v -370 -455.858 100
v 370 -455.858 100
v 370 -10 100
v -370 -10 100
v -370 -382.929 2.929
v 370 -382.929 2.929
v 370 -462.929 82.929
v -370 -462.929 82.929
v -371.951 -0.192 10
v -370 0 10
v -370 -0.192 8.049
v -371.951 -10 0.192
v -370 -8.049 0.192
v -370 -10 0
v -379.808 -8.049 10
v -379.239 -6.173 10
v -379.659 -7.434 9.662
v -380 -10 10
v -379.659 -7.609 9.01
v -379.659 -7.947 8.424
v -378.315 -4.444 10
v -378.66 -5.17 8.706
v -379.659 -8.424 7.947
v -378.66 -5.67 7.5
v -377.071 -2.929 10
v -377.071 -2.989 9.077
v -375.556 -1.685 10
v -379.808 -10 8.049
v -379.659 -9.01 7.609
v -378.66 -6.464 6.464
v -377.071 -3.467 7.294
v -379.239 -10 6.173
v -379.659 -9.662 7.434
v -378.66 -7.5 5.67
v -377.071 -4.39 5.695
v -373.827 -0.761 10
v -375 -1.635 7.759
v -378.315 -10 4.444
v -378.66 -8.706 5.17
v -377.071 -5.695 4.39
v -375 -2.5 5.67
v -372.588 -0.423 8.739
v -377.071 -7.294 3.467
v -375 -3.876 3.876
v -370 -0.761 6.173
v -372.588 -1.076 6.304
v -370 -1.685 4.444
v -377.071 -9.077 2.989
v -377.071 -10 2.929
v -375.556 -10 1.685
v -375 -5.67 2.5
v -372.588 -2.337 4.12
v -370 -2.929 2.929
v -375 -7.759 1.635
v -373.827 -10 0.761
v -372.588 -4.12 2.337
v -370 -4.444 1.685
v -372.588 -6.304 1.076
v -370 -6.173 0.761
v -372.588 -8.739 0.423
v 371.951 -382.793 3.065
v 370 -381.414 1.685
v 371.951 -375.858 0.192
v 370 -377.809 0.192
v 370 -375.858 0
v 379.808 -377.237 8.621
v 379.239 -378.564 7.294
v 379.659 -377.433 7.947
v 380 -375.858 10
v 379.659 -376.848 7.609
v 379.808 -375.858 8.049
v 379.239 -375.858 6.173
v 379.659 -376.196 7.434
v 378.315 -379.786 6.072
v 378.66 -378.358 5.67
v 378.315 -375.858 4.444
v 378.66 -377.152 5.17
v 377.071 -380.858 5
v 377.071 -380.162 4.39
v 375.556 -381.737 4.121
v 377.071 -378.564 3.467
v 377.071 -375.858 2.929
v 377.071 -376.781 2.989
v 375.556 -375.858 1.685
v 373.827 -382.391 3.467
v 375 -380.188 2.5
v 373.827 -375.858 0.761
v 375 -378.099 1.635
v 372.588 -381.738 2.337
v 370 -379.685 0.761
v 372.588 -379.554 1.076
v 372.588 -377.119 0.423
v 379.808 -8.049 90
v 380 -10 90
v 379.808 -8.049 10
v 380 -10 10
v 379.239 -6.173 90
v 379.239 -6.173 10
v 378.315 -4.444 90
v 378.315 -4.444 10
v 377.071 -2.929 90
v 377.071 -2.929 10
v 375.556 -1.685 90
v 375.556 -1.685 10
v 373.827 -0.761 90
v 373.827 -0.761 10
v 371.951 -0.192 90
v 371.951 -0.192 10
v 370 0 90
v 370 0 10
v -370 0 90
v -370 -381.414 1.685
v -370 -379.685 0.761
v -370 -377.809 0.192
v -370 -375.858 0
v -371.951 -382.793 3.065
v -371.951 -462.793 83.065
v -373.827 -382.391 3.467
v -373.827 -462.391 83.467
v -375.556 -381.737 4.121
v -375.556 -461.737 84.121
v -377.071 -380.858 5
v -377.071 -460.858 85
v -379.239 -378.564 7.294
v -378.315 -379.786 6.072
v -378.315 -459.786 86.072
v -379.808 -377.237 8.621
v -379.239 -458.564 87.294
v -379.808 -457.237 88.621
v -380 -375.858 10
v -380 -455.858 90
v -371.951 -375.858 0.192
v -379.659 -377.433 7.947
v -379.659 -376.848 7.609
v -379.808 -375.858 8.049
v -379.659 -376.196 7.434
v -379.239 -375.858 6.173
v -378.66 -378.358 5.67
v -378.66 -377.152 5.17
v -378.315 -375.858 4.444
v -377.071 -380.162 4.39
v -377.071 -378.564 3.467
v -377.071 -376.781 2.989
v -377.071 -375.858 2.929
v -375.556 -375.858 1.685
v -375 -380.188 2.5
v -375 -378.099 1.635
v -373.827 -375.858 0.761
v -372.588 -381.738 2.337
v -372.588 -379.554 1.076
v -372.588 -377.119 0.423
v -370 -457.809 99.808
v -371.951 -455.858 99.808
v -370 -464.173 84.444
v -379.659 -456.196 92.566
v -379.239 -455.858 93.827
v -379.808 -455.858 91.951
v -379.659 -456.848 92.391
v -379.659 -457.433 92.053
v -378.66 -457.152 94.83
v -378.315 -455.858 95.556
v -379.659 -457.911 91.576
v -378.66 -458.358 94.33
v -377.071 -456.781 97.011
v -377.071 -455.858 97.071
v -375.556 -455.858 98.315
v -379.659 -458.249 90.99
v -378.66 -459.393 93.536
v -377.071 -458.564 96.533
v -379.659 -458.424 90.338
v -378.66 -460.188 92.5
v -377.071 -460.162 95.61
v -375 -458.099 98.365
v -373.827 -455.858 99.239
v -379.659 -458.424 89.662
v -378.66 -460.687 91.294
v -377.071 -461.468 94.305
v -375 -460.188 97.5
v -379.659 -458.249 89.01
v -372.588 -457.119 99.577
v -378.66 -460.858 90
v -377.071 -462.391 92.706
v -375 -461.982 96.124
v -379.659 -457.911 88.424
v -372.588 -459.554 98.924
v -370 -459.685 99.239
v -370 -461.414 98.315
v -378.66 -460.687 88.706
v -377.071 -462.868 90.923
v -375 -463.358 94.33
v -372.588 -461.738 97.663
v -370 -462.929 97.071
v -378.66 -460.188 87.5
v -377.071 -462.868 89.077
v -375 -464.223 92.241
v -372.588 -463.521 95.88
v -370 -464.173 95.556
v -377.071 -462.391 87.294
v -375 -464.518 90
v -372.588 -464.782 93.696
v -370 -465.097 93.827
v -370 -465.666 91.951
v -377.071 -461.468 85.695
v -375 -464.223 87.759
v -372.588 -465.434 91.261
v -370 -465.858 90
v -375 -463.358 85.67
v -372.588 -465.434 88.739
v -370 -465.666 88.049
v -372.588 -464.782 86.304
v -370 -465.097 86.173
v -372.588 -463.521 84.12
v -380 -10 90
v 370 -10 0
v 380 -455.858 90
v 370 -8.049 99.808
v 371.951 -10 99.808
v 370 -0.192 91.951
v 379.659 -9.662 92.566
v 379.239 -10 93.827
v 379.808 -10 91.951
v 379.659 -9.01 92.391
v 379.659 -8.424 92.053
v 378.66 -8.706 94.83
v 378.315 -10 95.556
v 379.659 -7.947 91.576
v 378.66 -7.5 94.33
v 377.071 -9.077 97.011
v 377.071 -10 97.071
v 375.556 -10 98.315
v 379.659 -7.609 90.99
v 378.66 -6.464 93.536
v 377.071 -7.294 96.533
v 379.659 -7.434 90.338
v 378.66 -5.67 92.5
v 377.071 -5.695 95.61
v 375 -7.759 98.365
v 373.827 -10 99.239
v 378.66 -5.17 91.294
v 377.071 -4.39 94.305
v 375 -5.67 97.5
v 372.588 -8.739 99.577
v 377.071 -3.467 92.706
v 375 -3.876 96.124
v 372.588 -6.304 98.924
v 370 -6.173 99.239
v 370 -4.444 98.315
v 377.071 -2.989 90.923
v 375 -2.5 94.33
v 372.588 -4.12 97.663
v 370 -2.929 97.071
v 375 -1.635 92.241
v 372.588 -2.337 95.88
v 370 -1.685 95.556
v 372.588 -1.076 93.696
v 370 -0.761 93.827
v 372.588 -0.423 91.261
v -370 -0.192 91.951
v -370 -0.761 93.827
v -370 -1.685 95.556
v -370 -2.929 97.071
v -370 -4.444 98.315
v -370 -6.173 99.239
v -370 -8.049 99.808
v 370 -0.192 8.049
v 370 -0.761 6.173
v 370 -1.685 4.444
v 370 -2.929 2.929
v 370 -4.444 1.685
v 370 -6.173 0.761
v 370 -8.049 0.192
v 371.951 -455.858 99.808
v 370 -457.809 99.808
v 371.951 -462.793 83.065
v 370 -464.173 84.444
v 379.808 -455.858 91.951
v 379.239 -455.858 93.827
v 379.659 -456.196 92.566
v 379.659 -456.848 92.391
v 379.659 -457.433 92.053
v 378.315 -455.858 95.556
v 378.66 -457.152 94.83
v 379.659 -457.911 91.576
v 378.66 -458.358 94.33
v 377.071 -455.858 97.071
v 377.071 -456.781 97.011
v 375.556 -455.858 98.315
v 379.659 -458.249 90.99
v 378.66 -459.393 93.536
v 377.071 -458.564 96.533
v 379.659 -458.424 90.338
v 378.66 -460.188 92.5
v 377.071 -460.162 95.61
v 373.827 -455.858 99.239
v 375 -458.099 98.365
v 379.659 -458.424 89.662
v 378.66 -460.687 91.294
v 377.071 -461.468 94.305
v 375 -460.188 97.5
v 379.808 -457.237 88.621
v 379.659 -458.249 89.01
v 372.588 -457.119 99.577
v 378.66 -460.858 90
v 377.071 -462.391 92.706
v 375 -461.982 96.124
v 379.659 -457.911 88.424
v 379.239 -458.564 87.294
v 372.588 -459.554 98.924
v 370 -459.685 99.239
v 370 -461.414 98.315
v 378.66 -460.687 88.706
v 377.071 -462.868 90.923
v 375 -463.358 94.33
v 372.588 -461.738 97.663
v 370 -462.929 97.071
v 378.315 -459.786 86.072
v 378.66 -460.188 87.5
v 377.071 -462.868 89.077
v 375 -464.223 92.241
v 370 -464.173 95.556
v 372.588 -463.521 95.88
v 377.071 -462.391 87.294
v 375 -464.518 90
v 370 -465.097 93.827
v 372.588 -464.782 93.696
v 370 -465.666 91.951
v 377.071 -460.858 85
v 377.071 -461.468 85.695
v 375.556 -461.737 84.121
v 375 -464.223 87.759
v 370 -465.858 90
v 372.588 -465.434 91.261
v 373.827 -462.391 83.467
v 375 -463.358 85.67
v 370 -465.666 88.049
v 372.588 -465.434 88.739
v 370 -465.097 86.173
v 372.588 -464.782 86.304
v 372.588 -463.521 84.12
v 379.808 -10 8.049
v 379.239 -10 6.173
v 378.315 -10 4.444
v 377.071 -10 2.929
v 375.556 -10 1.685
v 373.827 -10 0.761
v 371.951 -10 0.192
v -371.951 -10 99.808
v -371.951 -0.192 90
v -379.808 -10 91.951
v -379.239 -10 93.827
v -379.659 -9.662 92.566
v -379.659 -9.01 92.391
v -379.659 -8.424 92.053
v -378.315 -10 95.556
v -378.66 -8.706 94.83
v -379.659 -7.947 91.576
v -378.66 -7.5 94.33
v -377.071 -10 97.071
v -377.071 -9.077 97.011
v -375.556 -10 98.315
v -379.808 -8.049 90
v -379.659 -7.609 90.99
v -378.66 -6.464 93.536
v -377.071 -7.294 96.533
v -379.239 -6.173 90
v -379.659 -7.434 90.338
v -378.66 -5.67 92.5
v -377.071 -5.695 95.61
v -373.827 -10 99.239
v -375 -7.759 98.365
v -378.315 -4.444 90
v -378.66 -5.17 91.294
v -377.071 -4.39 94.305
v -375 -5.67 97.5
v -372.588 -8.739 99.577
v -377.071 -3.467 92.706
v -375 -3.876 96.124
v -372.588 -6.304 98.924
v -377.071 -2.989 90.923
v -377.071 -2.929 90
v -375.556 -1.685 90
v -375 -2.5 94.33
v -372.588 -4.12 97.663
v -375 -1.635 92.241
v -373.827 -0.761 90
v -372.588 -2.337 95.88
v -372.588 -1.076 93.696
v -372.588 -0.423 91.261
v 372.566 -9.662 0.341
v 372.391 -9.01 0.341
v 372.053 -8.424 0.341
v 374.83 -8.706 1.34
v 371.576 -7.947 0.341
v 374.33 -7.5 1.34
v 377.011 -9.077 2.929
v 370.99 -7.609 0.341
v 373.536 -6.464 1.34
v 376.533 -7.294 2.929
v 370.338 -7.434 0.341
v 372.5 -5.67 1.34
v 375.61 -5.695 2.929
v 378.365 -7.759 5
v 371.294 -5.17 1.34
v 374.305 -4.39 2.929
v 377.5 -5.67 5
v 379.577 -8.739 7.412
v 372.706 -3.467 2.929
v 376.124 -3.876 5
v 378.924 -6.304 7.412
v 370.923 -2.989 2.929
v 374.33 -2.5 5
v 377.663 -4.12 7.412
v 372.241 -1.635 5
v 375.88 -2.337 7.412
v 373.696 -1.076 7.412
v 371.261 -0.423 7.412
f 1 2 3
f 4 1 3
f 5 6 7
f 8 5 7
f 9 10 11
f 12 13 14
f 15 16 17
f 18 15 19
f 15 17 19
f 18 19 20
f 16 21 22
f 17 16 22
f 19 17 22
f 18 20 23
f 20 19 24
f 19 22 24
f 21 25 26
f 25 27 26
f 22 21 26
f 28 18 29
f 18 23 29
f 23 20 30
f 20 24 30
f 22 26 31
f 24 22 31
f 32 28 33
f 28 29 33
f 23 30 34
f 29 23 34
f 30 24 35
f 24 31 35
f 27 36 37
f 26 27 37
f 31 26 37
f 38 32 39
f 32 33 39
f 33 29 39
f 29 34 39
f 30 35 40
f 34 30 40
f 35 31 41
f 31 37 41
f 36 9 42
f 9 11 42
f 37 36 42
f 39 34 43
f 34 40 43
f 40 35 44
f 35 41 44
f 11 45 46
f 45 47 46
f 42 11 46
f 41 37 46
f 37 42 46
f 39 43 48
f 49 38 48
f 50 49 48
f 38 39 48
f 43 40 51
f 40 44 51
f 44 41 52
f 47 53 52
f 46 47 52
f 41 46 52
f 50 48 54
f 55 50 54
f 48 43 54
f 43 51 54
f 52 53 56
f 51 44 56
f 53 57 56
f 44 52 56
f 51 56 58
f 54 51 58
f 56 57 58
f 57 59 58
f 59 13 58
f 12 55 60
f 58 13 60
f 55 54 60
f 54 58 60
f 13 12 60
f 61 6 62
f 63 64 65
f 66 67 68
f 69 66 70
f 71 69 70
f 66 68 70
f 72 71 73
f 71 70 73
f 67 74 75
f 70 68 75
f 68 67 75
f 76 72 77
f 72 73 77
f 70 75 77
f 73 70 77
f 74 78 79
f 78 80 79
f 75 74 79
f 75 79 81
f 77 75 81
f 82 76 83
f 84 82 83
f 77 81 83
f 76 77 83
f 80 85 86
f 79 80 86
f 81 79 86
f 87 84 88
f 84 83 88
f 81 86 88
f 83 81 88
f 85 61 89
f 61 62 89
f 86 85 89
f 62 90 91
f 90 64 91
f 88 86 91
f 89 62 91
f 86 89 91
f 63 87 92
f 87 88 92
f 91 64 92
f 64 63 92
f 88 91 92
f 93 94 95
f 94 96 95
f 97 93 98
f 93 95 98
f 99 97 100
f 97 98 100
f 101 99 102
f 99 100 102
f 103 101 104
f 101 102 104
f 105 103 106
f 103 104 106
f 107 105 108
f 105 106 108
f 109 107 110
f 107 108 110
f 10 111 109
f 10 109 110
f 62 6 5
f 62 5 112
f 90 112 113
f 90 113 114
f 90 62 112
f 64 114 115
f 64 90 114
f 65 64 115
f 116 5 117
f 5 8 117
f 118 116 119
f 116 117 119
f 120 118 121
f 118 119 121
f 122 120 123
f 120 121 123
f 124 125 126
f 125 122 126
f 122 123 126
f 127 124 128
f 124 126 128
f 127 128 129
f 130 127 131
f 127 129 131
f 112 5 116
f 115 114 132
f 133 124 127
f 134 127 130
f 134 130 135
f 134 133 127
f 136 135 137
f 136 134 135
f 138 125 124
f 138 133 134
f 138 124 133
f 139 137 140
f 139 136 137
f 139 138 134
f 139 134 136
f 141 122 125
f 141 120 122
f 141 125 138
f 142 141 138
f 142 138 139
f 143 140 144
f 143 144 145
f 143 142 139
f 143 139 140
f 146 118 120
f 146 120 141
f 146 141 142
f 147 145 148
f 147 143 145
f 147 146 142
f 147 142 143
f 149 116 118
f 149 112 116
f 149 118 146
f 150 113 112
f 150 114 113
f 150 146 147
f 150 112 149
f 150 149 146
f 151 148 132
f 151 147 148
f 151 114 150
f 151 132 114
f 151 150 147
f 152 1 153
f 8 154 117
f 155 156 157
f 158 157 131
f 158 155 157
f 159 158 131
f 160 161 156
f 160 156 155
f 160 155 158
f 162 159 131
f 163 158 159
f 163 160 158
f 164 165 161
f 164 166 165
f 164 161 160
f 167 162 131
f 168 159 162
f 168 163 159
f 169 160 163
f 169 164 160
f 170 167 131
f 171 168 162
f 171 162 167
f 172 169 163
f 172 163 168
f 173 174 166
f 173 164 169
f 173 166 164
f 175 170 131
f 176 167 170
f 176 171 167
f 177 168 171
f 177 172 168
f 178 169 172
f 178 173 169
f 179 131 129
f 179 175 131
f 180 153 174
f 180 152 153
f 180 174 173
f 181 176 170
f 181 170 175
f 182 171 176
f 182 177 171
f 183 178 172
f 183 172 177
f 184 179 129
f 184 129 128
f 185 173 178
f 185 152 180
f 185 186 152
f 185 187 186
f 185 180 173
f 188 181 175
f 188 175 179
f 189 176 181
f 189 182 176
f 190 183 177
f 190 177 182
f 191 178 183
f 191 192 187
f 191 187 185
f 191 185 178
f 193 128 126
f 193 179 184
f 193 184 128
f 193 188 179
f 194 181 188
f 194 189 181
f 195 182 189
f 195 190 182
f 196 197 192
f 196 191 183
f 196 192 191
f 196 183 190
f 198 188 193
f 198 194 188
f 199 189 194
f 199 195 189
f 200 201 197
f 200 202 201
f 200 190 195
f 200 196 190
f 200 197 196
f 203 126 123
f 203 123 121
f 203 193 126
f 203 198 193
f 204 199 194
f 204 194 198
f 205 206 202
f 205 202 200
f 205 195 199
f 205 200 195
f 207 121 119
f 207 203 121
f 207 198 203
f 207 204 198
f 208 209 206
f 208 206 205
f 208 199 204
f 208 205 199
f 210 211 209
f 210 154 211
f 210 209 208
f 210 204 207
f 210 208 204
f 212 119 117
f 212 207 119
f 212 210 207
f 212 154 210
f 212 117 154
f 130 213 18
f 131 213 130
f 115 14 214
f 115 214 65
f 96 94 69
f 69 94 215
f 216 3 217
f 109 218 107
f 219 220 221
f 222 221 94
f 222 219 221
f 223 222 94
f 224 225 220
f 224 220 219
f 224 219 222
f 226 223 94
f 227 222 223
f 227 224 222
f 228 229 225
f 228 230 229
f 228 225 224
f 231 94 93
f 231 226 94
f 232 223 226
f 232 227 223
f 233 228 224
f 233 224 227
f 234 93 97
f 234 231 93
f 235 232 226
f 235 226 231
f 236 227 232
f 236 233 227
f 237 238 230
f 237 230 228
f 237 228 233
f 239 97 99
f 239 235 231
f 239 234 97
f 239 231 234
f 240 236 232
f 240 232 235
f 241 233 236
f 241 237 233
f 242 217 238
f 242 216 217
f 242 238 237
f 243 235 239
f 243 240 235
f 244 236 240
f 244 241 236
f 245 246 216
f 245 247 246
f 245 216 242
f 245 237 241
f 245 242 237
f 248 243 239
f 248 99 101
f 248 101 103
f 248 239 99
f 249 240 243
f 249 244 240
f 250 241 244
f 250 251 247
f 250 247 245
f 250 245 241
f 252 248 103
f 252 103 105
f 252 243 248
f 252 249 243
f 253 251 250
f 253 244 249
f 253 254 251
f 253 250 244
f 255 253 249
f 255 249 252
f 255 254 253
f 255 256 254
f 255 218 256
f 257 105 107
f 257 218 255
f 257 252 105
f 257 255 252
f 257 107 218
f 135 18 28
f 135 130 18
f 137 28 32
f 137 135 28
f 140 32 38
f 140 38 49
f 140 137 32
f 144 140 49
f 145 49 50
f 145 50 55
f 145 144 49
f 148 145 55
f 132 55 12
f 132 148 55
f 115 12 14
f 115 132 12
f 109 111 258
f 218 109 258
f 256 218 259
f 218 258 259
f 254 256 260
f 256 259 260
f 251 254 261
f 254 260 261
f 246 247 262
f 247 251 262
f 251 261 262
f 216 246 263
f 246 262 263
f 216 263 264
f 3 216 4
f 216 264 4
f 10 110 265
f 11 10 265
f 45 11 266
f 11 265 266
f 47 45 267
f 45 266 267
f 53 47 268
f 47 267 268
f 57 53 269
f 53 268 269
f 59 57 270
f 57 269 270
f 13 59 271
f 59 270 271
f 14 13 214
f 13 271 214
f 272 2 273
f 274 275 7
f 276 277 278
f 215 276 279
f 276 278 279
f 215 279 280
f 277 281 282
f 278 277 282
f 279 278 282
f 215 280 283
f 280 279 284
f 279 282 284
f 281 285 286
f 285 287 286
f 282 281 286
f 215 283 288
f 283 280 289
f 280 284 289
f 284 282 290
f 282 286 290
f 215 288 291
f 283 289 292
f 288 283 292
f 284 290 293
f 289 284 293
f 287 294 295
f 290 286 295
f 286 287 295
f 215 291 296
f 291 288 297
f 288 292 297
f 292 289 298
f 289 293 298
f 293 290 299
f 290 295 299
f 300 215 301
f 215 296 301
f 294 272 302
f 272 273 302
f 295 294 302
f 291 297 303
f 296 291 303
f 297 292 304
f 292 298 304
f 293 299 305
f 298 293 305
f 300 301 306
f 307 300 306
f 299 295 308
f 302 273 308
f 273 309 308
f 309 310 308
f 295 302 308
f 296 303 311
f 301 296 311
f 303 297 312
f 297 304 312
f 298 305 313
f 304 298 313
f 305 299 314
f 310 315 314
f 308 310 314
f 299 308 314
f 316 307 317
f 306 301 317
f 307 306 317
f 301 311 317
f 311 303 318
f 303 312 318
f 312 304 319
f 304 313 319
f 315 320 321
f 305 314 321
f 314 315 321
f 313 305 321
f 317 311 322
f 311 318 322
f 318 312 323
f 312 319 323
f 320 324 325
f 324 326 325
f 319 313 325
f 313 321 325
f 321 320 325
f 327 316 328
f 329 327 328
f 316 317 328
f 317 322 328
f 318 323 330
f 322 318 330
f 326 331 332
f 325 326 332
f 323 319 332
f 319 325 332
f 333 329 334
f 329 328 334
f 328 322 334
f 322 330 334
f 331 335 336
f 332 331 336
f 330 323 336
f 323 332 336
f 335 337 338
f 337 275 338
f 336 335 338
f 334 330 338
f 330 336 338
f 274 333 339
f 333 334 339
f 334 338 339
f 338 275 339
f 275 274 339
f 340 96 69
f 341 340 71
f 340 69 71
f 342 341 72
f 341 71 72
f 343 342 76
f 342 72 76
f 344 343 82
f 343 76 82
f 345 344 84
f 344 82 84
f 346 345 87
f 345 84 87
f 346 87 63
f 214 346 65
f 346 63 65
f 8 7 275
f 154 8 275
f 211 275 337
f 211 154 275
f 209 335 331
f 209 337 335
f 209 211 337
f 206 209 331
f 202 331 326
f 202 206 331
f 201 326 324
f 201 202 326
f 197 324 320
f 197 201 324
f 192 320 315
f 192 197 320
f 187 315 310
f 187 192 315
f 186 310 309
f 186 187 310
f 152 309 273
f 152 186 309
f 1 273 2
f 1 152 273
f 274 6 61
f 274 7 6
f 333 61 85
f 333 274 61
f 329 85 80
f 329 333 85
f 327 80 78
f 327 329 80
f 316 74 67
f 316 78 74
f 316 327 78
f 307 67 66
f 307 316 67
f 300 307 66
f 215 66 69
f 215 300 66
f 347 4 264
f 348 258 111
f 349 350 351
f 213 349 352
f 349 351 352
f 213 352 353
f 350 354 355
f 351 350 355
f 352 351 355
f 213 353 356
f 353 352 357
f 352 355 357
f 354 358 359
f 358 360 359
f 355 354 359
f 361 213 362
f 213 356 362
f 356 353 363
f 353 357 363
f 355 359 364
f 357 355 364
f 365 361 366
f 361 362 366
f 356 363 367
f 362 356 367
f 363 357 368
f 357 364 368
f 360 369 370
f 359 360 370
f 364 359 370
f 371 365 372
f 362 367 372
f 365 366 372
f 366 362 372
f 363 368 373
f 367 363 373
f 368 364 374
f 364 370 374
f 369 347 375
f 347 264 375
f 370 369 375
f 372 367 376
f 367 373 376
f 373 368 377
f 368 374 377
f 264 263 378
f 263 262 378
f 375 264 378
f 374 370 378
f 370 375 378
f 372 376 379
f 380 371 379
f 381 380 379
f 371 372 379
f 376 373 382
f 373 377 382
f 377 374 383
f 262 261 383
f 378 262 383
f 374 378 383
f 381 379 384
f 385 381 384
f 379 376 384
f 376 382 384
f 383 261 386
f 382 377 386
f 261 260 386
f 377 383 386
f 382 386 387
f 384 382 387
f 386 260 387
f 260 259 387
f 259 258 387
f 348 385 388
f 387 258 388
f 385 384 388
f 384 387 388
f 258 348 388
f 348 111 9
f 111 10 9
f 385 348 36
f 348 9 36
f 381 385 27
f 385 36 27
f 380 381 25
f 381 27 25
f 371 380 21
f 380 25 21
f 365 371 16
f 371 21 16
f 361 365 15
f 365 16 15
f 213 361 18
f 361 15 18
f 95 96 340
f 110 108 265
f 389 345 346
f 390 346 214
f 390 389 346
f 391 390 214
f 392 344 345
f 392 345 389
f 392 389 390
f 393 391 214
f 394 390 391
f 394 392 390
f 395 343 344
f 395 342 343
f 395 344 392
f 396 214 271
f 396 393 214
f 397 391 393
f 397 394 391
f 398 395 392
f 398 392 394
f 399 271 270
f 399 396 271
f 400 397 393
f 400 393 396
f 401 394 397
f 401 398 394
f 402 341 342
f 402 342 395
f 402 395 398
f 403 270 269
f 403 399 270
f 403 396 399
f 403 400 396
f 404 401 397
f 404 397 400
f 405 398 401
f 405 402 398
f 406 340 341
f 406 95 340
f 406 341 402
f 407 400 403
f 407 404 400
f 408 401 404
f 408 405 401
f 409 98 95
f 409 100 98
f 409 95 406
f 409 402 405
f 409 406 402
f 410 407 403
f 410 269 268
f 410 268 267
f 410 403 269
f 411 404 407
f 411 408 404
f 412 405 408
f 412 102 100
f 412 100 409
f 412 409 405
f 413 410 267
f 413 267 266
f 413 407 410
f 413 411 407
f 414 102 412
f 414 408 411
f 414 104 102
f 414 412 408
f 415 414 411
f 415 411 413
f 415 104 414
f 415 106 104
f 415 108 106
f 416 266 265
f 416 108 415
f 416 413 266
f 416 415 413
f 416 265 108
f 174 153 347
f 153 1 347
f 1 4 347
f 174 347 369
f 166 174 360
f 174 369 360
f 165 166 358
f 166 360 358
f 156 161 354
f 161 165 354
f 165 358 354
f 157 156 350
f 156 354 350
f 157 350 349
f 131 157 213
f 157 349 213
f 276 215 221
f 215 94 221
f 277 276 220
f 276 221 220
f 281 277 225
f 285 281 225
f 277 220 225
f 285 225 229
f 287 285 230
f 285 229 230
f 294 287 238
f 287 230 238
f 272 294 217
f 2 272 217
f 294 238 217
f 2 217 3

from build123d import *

# Parameters (mm, degrees)
PAD_DEPTH      = 380
PAD_DEPTH_BACK = 380
FILLET_R       = 10


with BuildPart() as part:
    # Sketch → Pad (new body, two sides)
    with BuildSketch(Plane.YZ) as pad_sk:
        Polygon((-380, 0), (-480, 100), (0, 100), (0, 0), align=None)
    extrude(amount=PAD_DEPTH)
    extrude(pad_sk.sketch, amount=-PAD_DEPTH_BACK)

    # Fillet
    fillet_edges = [part.edges().sort_by_distance(p)[0] for p in [
        (0, -480, 100),
        (0, 0, 100),
        (-380, -240, 100),
        (380, -240, 100),
        (0, -380, 0),
        (-380, -430, 50),
        (380, -430, 50),
        (380, 0, 50),
        (380, -190, 0),
        (0, 0, 0),
        (-380, 0, 50),
        (-380, -190, 0),
    ]]
    fillet(fillet_edges, radius=FILLET_R)


solid = part.part
